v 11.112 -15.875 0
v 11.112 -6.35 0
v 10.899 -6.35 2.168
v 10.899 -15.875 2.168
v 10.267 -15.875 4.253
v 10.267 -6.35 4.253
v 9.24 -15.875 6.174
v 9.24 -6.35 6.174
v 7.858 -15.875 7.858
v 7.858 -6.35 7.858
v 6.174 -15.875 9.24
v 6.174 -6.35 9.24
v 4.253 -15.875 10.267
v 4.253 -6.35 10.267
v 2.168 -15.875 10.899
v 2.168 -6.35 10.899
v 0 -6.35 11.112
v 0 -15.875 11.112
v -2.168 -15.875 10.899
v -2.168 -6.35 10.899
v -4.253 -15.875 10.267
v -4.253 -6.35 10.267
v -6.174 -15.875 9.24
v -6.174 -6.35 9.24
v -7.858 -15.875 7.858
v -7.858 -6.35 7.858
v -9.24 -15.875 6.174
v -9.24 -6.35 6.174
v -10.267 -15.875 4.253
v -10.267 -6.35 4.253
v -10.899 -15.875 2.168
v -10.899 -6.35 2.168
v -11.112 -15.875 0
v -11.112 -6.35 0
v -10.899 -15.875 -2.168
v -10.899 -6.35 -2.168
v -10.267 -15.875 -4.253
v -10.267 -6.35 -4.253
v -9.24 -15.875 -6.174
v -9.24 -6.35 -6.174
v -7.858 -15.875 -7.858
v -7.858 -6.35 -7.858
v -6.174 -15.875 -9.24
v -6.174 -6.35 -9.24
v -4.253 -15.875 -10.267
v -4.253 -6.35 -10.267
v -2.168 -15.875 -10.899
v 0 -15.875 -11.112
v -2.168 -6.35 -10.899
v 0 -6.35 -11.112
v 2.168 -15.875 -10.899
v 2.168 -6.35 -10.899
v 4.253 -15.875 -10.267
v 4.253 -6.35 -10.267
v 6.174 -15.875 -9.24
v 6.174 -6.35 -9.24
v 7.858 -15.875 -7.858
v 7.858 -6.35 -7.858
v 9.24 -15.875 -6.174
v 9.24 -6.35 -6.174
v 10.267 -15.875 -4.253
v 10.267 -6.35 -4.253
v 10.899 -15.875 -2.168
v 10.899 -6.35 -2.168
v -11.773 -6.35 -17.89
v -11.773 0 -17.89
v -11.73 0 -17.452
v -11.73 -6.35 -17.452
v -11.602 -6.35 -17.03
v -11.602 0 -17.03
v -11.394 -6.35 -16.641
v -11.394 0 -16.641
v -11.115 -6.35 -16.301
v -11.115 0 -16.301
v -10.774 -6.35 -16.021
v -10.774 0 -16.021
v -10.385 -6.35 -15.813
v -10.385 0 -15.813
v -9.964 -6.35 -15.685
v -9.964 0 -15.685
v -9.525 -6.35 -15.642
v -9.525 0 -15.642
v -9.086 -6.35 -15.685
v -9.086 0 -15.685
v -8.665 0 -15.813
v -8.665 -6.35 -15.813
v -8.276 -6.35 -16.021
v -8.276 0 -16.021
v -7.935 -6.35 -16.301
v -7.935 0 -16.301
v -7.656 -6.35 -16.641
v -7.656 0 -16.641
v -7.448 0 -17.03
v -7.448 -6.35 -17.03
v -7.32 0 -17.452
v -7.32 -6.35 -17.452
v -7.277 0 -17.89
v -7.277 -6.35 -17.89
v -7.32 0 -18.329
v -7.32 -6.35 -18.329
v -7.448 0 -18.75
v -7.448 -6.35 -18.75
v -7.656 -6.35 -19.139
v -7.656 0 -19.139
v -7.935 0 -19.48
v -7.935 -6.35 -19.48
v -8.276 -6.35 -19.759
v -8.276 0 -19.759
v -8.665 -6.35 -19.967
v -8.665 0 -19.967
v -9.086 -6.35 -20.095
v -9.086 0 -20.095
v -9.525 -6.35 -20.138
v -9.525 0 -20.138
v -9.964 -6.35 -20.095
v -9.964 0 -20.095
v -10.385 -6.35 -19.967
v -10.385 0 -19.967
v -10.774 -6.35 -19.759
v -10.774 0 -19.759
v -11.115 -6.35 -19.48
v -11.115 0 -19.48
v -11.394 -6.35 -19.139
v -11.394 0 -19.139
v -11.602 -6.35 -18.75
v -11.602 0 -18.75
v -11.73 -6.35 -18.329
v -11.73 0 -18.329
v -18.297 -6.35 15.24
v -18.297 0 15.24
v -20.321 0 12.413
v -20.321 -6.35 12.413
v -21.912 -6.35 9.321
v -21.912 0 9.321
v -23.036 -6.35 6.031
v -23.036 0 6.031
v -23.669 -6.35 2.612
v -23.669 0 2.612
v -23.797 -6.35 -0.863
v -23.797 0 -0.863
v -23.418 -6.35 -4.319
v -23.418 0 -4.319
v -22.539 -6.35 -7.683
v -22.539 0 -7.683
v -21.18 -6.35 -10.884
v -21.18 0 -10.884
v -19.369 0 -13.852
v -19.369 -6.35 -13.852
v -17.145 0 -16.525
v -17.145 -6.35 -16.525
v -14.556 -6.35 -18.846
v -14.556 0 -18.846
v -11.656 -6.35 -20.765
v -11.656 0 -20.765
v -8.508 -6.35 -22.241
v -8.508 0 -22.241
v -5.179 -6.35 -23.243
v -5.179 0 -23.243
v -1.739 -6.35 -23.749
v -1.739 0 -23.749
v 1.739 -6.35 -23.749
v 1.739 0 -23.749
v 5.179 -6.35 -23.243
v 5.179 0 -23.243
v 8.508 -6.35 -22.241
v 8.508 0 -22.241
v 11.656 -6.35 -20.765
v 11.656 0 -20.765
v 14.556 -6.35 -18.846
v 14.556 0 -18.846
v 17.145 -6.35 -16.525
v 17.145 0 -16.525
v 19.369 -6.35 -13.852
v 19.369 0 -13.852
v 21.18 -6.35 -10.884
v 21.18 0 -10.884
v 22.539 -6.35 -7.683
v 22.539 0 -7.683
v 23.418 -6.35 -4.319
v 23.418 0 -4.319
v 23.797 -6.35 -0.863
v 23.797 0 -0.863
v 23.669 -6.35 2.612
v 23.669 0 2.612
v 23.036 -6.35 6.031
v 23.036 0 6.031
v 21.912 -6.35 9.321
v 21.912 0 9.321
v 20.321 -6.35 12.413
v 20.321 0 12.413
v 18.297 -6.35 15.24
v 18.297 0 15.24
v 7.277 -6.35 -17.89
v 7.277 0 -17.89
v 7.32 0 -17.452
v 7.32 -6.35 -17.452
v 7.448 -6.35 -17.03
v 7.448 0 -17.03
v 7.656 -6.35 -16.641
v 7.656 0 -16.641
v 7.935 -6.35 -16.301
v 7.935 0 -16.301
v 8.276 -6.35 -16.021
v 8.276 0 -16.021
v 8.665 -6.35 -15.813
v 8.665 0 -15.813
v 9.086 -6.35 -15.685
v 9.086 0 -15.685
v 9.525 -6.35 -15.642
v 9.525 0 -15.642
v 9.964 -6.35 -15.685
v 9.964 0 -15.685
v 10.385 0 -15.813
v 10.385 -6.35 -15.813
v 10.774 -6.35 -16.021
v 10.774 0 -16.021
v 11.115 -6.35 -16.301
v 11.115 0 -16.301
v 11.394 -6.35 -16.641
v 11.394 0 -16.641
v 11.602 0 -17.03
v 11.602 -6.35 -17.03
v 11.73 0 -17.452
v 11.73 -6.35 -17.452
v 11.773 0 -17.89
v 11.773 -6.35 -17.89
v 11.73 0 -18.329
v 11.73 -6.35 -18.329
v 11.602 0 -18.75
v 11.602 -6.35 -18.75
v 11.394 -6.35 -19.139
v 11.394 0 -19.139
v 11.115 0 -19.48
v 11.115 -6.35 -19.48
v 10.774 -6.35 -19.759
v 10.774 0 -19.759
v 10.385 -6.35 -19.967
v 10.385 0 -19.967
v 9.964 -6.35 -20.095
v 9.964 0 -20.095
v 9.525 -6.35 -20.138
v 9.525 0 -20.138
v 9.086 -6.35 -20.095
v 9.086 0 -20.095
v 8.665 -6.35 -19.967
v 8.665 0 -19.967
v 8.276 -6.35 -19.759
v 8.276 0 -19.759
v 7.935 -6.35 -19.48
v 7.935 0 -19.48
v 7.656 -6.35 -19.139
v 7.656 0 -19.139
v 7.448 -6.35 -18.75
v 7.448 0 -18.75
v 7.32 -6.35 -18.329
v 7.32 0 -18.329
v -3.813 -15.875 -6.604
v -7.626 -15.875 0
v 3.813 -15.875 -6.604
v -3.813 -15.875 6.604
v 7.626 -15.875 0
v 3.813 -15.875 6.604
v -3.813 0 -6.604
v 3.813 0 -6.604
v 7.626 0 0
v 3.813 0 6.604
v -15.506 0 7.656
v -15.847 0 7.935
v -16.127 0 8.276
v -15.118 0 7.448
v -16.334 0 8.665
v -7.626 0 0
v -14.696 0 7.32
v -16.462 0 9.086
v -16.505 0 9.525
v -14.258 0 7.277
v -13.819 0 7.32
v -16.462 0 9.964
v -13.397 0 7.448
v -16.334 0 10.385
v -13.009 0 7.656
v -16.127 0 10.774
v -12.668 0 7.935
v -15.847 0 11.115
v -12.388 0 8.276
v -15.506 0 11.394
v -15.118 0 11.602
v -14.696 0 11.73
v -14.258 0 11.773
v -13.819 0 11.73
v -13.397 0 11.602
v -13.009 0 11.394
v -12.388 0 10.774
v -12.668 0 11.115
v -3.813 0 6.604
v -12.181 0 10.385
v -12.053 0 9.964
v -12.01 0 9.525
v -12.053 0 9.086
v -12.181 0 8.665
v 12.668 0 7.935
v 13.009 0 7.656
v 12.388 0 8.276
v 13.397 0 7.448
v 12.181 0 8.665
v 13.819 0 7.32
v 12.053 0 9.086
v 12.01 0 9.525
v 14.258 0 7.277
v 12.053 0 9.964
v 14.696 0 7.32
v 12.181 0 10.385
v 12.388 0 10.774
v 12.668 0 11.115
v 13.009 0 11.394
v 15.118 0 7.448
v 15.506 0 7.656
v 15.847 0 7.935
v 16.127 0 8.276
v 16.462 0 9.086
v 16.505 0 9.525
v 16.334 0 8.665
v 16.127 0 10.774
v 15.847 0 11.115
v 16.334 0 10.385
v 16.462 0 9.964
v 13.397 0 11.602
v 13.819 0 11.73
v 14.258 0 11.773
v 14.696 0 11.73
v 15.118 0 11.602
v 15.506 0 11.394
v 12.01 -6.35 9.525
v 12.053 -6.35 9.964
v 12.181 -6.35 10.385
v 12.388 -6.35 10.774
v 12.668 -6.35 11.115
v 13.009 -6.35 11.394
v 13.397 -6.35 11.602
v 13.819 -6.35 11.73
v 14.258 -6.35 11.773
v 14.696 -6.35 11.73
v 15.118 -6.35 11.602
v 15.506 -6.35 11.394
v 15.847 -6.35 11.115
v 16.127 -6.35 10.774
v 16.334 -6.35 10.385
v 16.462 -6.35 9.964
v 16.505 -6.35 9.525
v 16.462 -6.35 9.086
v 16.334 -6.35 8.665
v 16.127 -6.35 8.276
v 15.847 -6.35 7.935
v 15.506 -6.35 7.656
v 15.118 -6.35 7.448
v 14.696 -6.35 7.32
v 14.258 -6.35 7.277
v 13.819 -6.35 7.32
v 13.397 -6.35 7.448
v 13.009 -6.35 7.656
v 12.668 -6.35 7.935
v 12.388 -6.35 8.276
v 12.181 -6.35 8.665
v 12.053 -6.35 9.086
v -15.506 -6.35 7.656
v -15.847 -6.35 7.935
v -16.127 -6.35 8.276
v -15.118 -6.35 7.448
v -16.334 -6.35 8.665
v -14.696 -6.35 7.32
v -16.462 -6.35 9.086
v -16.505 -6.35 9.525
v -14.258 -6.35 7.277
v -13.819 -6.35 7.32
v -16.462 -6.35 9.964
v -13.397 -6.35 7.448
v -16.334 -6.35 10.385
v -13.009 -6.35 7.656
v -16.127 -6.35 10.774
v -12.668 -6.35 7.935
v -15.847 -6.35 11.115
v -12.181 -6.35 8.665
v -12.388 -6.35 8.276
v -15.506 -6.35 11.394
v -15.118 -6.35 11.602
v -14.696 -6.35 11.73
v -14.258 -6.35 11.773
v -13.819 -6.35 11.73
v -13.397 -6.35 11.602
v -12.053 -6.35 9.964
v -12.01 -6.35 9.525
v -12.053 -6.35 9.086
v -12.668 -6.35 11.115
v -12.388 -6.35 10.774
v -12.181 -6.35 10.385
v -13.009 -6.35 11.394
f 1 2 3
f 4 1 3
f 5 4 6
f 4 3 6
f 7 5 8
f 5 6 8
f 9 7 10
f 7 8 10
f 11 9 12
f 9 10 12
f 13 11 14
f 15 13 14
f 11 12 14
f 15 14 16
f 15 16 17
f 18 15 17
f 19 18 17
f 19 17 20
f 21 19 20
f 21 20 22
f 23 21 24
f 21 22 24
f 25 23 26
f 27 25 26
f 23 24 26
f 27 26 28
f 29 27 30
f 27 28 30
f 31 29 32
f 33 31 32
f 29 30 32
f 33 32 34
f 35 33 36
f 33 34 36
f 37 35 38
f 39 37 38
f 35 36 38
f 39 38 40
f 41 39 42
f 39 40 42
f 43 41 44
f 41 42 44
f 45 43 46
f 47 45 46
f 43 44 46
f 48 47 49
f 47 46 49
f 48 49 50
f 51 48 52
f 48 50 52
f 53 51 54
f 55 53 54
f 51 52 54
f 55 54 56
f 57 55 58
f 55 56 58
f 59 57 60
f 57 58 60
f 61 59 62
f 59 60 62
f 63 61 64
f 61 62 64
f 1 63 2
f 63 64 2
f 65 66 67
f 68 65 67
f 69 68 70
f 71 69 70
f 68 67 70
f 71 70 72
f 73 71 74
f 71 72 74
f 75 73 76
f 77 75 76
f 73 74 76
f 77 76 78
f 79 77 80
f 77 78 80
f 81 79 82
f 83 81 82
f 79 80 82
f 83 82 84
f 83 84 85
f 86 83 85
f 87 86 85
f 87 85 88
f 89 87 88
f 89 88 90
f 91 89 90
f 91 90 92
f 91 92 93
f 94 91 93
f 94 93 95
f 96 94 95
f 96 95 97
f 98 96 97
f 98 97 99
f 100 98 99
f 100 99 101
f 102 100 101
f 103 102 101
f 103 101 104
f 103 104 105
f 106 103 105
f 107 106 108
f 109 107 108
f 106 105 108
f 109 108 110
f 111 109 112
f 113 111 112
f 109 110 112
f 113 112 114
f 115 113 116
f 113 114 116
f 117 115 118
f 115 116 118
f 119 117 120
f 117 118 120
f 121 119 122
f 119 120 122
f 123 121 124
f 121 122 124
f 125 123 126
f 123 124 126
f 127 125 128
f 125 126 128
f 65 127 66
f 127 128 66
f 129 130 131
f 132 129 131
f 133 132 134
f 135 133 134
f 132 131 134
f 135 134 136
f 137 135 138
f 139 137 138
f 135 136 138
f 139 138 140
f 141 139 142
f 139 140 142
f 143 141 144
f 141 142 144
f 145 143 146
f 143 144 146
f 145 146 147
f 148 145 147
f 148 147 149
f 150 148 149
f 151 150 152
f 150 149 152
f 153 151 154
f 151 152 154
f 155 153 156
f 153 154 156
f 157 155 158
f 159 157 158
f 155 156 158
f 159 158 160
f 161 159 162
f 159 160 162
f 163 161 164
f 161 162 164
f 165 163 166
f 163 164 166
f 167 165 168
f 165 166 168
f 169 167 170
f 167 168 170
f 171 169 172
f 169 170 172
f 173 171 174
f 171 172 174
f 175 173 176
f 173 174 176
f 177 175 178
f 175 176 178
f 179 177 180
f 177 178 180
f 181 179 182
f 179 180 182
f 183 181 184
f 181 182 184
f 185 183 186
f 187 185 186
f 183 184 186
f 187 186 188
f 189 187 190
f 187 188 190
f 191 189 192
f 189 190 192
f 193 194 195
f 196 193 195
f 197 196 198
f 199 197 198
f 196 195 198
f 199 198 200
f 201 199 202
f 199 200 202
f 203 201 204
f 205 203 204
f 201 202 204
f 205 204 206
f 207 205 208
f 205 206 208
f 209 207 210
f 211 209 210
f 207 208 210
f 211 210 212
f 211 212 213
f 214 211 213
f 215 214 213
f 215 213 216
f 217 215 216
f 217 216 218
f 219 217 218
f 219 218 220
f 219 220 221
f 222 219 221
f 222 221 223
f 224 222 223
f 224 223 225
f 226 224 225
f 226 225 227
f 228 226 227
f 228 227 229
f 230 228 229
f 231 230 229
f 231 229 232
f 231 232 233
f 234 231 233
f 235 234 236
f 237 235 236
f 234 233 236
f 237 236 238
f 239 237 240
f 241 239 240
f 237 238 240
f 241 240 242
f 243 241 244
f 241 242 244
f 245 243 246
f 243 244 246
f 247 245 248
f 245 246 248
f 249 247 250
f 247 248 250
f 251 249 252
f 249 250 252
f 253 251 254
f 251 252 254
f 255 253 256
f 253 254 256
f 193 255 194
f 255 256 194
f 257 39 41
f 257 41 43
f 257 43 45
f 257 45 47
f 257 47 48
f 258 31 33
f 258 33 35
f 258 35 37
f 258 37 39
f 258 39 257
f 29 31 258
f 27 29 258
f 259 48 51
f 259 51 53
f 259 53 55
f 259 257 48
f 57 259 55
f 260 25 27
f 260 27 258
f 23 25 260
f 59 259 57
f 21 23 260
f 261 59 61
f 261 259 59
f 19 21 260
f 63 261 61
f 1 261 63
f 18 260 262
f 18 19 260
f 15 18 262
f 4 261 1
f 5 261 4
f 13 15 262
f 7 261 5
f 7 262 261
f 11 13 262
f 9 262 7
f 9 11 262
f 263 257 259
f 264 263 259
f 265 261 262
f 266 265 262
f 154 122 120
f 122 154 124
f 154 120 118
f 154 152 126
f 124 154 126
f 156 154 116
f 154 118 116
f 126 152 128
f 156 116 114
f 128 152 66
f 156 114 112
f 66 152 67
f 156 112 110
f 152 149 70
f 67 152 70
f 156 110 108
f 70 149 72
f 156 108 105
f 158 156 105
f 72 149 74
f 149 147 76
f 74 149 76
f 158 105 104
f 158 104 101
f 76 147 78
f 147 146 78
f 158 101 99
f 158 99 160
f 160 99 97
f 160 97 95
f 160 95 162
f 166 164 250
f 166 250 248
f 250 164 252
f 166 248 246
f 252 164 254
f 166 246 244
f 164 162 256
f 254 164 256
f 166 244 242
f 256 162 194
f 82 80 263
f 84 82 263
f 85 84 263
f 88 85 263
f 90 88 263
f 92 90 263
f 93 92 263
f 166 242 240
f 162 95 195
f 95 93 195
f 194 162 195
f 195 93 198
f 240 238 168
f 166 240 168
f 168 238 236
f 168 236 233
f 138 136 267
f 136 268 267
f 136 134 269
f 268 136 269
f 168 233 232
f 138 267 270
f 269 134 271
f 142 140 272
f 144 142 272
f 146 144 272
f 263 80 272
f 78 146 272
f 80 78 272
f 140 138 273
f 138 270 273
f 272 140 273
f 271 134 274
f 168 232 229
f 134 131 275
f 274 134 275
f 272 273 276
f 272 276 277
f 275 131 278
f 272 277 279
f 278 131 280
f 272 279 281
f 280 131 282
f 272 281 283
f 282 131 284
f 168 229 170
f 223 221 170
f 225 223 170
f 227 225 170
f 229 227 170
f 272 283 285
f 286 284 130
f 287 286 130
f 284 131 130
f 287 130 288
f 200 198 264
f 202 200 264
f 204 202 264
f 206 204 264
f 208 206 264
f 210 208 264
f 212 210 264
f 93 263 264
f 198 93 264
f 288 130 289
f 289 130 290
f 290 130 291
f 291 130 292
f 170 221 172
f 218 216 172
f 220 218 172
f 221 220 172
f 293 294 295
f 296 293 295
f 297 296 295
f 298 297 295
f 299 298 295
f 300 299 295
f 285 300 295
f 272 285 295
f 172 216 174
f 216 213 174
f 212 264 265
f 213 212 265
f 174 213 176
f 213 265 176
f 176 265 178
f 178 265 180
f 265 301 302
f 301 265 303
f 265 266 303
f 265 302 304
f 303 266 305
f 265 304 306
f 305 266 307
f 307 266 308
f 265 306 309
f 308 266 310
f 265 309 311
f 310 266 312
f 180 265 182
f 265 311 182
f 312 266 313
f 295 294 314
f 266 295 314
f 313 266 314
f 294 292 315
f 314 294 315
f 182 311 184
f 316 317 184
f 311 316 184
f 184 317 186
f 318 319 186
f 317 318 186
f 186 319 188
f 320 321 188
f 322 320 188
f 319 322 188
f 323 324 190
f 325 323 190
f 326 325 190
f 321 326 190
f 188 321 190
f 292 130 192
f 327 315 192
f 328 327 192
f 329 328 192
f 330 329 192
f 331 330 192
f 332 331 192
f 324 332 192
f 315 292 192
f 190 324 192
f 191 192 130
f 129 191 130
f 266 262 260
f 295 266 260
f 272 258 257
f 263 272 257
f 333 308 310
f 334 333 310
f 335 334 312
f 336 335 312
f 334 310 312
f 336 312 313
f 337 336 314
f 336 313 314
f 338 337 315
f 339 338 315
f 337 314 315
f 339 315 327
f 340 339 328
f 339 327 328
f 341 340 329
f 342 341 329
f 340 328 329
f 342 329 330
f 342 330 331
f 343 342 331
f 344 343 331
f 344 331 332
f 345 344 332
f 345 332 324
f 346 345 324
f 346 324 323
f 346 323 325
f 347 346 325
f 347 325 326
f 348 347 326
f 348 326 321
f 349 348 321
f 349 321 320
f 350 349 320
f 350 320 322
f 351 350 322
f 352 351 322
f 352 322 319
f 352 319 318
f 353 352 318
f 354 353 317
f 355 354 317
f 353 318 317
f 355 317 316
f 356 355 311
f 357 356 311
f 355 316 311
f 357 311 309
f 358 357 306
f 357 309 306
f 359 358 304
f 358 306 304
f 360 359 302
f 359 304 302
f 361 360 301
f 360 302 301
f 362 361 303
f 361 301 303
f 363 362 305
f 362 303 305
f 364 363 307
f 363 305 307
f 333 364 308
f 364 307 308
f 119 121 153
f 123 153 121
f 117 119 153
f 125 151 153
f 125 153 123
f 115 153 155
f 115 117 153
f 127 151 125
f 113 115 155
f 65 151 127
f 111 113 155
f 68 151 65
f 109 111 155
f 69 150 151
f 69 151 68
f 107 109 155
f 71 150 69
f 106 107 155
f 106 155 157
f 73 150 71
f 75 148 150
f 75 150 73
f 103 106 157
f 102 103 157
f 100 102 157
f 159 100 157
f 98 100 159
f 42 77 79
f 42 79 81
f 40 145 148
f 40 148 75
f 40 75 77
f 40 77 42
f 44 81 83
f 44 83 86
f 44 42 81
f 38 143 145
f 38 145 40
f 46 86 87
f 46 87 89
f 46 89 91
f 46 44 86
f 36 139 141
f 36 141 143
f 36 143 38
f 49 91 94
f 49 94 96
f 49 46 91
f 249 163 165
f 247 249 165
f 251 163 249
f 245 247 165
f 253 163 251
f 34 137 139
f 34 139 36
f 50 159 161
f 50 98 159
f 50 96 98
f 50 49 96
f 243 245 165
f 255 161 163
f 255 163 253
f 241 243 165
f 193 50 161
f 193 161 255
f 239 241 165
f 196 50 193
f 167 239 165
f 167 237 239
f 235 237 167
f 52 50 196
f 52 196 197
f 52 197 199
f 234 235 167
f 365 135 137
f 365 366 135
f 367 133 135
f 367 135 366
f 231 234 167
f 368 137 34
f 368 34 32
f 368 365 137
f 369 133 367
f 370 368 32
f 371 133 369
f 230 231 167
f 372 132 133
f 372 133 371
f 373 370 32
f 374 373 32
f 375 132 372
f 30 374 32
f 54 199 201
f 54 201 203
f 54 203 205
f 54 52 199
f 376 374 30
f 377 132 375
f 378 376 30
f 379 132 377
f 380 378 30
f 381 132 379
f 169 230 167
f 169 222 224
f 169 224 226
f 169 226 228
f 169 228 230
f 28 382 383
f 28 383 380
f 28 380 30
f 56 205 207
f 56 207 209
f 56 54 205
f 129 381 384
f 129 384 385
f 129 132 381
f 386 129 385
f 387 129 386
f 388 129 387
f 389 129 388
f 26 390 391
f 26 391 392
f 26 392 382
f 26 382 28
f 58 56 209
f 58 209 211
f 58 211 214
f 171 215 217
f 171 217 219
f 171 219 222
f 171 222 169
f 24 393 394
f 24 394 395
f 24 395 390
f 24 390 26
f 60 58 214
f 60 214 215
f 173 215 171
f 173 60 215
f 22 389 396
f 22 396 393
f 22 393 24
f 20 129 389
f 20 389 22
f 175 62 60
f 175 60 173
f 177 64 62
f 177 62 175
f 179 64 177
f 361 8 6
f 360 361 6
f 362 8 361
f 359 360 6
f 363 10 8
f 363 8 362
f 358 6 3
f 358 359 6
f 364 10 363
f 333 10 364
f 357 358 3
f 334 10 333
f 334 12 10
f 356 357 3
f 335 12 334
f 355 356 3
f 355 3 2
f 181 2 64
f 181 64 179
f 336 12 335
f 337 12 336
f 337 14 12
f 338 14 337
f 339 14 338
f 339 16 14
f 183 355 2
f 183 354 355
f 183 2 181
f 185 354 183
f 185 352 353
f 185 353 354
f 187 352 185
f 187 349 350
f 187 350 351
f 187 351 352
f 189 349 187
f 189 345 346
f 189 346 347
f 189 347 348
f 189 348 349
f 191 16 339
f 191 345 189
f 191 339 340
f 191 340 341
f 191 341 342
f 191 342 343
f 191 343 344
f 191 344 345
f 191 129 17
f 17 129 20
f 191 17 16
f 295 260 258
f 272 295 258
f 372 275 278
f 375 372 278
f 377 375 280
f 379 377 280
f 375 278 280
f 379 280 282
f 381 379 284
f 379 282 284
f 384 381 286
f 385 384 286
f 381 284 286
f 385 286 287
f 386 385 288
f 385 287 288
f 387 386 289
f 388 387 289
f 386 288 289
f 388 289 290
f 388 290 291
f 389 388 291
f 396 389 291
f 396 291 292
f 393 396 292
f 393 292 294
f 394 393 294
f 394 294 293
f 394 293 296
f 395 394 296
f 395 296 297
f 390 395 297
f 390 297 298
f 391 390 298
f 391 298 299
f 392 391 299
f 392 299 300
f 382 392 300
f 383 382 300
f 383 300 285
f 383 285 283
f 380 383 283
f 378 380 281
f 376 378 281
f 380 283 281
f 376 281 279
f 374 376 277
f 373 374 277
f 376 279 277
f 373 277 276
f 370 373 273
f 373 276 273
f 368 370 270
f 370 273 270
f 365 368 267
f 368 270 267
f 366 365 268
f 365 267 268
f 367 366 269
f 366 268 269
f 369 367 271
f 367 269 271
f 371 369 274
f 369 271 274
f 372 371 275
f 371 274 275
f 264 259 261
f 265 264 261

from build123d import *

# Parameters (mm, degrees)
F1_DEPTH = 6.35
F3_D     = 4.4958
F4_R     = 11.1125
F5_DEPTH = 9.525
F7_DEPTH = 15.876


with BuildPart() as f1:
    # F0 (on Front) → F1 (new body)
    with BuildSketch(Plane.XZ):
        with BuildLine():
            Line((18.2969275085, 15.24), (-18.2969275085, 15.24))
            ThreePointArc((-18.2969275085, 15.24), (0, -23.8125), (18.2969275085, 15.24))
        make_face()
    extrude(amount=F1_DEPTH)

    # F3 (through all)
    with Locations(Plane.XZ.offset(6.35)):
        with Locations((-14.2575098316, 9.525), (14.2575098316, 9.525), (9.525, -17.8901402442), (-9.525, -17.8901402442)):
            Hole(F3_D / 2)

    # F4 (on face) → F5 (join)
    with BuildSketch(Plane.XZ.offset(6.35)):
        Circle(F4_R)
    extrude(amount=F5_DEPTH)

    # F6 (on face) → F7 (cut, through all)
    with BuildSketch(Plane.XZ.offset(15.875)):
        Polygon((3.8128211777, -6.604), (7.6256423555, 0), (3.8128211777, 6.604), (-3.8128211777, 6.604), (-7.6256423555, 0), (-3.8128211777, -6.604), align=None)
    extrude(amount=-F7_DEPTH, mode=Mode.SUBTRACT)


solid = f1.part
